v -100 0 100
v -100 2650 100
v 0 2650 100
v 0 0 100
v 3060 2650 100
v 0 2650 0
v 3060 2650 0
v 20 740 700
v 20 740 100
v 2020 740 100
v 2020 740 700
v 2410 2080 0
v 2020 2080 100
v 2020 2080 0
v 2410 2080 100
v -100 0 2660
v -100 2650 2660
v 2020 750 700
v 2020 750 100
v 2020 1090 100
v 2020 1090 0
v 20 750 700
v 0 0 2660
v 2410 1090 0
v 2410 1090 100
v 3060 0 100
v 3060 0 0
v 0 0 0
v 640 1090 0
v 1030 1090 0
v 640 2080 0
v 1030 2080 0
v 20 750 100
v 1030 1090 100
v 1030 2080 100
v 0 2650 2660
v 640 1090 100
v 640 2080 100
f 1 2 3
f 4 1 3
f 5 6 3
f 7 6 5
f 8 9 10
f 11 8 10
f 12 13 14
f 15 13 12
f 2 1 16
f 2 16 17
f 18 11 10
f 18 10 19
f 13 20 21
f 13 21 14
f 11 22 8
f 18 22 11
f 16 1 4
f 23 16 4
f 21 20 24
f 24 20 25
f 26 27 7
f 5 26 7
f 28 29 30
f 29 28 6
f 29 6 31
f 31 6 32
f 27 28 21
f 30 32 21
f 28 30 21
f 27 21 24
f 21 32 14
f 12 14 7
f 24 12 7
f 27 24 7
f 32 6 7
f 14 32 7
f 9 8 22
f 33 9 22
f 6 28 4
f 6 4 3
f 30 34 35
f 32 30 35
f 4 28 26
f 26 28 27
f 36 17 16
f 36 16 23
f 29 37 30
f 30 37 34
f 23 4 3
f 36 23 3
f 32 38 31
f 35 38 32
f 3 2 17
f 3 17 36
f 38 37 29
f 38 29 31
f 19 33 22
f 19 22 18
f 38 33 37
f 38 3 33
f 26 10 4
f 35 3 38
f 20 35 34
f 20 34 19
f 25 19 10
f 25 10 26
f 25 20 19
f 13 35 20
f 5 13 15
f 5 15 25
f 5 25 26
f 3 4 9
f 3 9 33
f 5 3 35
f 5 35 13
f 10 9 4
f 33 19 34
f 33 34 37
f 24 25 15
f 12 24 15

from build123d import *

# Parameters (mm, degrees)
ESBO_O6_W                = 3060
ESBO_O6_H                = 2650
RESSALTO_EXTRUS_O2_DEPTH = 100
ESBO_O7_W                = 390
ESBO_O7_H                = 990
CORTE_EXTRUS_O1_DEPTH    = 749
ESBO_O8_W                = 100
ESBO_O8_H                = 2650
RESSALTO_EXTRUS_O3_DEPTH = 2560
ESBO_O14_W               = 2000
ESBO_O14_H               = 10
RESSALTO_EXTRUS_O5_DEPTH = 600


with BuildPart() as part:
    # Esboço6 → Ressalto-extrusão2 (new body)
    with BuildSketch(Plane.XY):
        with Locations((1530, 1325)):
            Rectangle(ESBO_O6_W, ESBO_O6_H)
    extrude(amount=RESSALTO_EXTRUS_O2_DEPTH)

    # Esboço7 → Corte-extrusão1 (cut)
    with BuildSketch(Plane.XY.offset(100)):
        with Locations((2215, 1585)):
            Rectangle(ESBO_O7_W, ESBO_O7_H)
        with Locations((835, 1585)):
            Rectangle(ESBO_O7_W, ESBO_O7_H)
    extrude(amount=-CORTE_EXTRUS_O1_DEPTH, mode=Mode.SUBTRACT)

    # Esboço14 → Ressalto-extrusão5 (add)
    with BuildSketch(Plane.XY.offset(100)):
        with Locations((1020, 745)):
            Rectangle(ESBO_O14_W, ESBO_O14_H)
    extrude(amount=RESSALTO_EXTRUS_O5_DEPTH)


with BuildPart() as body_2:
    # Esboço8 → Ressalto-extrusão3 (new body)
    with BuildSketch(Plane.XY.offset(100)):
        with Locations((-50, 1325)):
            Rectangle(ESBO_O8_W, ESBO_O8_H)
    extrude(amount=RESSALTO_EXTRUS_O3_DEPTH)


solid = Compound([part.part, body_2.part])
